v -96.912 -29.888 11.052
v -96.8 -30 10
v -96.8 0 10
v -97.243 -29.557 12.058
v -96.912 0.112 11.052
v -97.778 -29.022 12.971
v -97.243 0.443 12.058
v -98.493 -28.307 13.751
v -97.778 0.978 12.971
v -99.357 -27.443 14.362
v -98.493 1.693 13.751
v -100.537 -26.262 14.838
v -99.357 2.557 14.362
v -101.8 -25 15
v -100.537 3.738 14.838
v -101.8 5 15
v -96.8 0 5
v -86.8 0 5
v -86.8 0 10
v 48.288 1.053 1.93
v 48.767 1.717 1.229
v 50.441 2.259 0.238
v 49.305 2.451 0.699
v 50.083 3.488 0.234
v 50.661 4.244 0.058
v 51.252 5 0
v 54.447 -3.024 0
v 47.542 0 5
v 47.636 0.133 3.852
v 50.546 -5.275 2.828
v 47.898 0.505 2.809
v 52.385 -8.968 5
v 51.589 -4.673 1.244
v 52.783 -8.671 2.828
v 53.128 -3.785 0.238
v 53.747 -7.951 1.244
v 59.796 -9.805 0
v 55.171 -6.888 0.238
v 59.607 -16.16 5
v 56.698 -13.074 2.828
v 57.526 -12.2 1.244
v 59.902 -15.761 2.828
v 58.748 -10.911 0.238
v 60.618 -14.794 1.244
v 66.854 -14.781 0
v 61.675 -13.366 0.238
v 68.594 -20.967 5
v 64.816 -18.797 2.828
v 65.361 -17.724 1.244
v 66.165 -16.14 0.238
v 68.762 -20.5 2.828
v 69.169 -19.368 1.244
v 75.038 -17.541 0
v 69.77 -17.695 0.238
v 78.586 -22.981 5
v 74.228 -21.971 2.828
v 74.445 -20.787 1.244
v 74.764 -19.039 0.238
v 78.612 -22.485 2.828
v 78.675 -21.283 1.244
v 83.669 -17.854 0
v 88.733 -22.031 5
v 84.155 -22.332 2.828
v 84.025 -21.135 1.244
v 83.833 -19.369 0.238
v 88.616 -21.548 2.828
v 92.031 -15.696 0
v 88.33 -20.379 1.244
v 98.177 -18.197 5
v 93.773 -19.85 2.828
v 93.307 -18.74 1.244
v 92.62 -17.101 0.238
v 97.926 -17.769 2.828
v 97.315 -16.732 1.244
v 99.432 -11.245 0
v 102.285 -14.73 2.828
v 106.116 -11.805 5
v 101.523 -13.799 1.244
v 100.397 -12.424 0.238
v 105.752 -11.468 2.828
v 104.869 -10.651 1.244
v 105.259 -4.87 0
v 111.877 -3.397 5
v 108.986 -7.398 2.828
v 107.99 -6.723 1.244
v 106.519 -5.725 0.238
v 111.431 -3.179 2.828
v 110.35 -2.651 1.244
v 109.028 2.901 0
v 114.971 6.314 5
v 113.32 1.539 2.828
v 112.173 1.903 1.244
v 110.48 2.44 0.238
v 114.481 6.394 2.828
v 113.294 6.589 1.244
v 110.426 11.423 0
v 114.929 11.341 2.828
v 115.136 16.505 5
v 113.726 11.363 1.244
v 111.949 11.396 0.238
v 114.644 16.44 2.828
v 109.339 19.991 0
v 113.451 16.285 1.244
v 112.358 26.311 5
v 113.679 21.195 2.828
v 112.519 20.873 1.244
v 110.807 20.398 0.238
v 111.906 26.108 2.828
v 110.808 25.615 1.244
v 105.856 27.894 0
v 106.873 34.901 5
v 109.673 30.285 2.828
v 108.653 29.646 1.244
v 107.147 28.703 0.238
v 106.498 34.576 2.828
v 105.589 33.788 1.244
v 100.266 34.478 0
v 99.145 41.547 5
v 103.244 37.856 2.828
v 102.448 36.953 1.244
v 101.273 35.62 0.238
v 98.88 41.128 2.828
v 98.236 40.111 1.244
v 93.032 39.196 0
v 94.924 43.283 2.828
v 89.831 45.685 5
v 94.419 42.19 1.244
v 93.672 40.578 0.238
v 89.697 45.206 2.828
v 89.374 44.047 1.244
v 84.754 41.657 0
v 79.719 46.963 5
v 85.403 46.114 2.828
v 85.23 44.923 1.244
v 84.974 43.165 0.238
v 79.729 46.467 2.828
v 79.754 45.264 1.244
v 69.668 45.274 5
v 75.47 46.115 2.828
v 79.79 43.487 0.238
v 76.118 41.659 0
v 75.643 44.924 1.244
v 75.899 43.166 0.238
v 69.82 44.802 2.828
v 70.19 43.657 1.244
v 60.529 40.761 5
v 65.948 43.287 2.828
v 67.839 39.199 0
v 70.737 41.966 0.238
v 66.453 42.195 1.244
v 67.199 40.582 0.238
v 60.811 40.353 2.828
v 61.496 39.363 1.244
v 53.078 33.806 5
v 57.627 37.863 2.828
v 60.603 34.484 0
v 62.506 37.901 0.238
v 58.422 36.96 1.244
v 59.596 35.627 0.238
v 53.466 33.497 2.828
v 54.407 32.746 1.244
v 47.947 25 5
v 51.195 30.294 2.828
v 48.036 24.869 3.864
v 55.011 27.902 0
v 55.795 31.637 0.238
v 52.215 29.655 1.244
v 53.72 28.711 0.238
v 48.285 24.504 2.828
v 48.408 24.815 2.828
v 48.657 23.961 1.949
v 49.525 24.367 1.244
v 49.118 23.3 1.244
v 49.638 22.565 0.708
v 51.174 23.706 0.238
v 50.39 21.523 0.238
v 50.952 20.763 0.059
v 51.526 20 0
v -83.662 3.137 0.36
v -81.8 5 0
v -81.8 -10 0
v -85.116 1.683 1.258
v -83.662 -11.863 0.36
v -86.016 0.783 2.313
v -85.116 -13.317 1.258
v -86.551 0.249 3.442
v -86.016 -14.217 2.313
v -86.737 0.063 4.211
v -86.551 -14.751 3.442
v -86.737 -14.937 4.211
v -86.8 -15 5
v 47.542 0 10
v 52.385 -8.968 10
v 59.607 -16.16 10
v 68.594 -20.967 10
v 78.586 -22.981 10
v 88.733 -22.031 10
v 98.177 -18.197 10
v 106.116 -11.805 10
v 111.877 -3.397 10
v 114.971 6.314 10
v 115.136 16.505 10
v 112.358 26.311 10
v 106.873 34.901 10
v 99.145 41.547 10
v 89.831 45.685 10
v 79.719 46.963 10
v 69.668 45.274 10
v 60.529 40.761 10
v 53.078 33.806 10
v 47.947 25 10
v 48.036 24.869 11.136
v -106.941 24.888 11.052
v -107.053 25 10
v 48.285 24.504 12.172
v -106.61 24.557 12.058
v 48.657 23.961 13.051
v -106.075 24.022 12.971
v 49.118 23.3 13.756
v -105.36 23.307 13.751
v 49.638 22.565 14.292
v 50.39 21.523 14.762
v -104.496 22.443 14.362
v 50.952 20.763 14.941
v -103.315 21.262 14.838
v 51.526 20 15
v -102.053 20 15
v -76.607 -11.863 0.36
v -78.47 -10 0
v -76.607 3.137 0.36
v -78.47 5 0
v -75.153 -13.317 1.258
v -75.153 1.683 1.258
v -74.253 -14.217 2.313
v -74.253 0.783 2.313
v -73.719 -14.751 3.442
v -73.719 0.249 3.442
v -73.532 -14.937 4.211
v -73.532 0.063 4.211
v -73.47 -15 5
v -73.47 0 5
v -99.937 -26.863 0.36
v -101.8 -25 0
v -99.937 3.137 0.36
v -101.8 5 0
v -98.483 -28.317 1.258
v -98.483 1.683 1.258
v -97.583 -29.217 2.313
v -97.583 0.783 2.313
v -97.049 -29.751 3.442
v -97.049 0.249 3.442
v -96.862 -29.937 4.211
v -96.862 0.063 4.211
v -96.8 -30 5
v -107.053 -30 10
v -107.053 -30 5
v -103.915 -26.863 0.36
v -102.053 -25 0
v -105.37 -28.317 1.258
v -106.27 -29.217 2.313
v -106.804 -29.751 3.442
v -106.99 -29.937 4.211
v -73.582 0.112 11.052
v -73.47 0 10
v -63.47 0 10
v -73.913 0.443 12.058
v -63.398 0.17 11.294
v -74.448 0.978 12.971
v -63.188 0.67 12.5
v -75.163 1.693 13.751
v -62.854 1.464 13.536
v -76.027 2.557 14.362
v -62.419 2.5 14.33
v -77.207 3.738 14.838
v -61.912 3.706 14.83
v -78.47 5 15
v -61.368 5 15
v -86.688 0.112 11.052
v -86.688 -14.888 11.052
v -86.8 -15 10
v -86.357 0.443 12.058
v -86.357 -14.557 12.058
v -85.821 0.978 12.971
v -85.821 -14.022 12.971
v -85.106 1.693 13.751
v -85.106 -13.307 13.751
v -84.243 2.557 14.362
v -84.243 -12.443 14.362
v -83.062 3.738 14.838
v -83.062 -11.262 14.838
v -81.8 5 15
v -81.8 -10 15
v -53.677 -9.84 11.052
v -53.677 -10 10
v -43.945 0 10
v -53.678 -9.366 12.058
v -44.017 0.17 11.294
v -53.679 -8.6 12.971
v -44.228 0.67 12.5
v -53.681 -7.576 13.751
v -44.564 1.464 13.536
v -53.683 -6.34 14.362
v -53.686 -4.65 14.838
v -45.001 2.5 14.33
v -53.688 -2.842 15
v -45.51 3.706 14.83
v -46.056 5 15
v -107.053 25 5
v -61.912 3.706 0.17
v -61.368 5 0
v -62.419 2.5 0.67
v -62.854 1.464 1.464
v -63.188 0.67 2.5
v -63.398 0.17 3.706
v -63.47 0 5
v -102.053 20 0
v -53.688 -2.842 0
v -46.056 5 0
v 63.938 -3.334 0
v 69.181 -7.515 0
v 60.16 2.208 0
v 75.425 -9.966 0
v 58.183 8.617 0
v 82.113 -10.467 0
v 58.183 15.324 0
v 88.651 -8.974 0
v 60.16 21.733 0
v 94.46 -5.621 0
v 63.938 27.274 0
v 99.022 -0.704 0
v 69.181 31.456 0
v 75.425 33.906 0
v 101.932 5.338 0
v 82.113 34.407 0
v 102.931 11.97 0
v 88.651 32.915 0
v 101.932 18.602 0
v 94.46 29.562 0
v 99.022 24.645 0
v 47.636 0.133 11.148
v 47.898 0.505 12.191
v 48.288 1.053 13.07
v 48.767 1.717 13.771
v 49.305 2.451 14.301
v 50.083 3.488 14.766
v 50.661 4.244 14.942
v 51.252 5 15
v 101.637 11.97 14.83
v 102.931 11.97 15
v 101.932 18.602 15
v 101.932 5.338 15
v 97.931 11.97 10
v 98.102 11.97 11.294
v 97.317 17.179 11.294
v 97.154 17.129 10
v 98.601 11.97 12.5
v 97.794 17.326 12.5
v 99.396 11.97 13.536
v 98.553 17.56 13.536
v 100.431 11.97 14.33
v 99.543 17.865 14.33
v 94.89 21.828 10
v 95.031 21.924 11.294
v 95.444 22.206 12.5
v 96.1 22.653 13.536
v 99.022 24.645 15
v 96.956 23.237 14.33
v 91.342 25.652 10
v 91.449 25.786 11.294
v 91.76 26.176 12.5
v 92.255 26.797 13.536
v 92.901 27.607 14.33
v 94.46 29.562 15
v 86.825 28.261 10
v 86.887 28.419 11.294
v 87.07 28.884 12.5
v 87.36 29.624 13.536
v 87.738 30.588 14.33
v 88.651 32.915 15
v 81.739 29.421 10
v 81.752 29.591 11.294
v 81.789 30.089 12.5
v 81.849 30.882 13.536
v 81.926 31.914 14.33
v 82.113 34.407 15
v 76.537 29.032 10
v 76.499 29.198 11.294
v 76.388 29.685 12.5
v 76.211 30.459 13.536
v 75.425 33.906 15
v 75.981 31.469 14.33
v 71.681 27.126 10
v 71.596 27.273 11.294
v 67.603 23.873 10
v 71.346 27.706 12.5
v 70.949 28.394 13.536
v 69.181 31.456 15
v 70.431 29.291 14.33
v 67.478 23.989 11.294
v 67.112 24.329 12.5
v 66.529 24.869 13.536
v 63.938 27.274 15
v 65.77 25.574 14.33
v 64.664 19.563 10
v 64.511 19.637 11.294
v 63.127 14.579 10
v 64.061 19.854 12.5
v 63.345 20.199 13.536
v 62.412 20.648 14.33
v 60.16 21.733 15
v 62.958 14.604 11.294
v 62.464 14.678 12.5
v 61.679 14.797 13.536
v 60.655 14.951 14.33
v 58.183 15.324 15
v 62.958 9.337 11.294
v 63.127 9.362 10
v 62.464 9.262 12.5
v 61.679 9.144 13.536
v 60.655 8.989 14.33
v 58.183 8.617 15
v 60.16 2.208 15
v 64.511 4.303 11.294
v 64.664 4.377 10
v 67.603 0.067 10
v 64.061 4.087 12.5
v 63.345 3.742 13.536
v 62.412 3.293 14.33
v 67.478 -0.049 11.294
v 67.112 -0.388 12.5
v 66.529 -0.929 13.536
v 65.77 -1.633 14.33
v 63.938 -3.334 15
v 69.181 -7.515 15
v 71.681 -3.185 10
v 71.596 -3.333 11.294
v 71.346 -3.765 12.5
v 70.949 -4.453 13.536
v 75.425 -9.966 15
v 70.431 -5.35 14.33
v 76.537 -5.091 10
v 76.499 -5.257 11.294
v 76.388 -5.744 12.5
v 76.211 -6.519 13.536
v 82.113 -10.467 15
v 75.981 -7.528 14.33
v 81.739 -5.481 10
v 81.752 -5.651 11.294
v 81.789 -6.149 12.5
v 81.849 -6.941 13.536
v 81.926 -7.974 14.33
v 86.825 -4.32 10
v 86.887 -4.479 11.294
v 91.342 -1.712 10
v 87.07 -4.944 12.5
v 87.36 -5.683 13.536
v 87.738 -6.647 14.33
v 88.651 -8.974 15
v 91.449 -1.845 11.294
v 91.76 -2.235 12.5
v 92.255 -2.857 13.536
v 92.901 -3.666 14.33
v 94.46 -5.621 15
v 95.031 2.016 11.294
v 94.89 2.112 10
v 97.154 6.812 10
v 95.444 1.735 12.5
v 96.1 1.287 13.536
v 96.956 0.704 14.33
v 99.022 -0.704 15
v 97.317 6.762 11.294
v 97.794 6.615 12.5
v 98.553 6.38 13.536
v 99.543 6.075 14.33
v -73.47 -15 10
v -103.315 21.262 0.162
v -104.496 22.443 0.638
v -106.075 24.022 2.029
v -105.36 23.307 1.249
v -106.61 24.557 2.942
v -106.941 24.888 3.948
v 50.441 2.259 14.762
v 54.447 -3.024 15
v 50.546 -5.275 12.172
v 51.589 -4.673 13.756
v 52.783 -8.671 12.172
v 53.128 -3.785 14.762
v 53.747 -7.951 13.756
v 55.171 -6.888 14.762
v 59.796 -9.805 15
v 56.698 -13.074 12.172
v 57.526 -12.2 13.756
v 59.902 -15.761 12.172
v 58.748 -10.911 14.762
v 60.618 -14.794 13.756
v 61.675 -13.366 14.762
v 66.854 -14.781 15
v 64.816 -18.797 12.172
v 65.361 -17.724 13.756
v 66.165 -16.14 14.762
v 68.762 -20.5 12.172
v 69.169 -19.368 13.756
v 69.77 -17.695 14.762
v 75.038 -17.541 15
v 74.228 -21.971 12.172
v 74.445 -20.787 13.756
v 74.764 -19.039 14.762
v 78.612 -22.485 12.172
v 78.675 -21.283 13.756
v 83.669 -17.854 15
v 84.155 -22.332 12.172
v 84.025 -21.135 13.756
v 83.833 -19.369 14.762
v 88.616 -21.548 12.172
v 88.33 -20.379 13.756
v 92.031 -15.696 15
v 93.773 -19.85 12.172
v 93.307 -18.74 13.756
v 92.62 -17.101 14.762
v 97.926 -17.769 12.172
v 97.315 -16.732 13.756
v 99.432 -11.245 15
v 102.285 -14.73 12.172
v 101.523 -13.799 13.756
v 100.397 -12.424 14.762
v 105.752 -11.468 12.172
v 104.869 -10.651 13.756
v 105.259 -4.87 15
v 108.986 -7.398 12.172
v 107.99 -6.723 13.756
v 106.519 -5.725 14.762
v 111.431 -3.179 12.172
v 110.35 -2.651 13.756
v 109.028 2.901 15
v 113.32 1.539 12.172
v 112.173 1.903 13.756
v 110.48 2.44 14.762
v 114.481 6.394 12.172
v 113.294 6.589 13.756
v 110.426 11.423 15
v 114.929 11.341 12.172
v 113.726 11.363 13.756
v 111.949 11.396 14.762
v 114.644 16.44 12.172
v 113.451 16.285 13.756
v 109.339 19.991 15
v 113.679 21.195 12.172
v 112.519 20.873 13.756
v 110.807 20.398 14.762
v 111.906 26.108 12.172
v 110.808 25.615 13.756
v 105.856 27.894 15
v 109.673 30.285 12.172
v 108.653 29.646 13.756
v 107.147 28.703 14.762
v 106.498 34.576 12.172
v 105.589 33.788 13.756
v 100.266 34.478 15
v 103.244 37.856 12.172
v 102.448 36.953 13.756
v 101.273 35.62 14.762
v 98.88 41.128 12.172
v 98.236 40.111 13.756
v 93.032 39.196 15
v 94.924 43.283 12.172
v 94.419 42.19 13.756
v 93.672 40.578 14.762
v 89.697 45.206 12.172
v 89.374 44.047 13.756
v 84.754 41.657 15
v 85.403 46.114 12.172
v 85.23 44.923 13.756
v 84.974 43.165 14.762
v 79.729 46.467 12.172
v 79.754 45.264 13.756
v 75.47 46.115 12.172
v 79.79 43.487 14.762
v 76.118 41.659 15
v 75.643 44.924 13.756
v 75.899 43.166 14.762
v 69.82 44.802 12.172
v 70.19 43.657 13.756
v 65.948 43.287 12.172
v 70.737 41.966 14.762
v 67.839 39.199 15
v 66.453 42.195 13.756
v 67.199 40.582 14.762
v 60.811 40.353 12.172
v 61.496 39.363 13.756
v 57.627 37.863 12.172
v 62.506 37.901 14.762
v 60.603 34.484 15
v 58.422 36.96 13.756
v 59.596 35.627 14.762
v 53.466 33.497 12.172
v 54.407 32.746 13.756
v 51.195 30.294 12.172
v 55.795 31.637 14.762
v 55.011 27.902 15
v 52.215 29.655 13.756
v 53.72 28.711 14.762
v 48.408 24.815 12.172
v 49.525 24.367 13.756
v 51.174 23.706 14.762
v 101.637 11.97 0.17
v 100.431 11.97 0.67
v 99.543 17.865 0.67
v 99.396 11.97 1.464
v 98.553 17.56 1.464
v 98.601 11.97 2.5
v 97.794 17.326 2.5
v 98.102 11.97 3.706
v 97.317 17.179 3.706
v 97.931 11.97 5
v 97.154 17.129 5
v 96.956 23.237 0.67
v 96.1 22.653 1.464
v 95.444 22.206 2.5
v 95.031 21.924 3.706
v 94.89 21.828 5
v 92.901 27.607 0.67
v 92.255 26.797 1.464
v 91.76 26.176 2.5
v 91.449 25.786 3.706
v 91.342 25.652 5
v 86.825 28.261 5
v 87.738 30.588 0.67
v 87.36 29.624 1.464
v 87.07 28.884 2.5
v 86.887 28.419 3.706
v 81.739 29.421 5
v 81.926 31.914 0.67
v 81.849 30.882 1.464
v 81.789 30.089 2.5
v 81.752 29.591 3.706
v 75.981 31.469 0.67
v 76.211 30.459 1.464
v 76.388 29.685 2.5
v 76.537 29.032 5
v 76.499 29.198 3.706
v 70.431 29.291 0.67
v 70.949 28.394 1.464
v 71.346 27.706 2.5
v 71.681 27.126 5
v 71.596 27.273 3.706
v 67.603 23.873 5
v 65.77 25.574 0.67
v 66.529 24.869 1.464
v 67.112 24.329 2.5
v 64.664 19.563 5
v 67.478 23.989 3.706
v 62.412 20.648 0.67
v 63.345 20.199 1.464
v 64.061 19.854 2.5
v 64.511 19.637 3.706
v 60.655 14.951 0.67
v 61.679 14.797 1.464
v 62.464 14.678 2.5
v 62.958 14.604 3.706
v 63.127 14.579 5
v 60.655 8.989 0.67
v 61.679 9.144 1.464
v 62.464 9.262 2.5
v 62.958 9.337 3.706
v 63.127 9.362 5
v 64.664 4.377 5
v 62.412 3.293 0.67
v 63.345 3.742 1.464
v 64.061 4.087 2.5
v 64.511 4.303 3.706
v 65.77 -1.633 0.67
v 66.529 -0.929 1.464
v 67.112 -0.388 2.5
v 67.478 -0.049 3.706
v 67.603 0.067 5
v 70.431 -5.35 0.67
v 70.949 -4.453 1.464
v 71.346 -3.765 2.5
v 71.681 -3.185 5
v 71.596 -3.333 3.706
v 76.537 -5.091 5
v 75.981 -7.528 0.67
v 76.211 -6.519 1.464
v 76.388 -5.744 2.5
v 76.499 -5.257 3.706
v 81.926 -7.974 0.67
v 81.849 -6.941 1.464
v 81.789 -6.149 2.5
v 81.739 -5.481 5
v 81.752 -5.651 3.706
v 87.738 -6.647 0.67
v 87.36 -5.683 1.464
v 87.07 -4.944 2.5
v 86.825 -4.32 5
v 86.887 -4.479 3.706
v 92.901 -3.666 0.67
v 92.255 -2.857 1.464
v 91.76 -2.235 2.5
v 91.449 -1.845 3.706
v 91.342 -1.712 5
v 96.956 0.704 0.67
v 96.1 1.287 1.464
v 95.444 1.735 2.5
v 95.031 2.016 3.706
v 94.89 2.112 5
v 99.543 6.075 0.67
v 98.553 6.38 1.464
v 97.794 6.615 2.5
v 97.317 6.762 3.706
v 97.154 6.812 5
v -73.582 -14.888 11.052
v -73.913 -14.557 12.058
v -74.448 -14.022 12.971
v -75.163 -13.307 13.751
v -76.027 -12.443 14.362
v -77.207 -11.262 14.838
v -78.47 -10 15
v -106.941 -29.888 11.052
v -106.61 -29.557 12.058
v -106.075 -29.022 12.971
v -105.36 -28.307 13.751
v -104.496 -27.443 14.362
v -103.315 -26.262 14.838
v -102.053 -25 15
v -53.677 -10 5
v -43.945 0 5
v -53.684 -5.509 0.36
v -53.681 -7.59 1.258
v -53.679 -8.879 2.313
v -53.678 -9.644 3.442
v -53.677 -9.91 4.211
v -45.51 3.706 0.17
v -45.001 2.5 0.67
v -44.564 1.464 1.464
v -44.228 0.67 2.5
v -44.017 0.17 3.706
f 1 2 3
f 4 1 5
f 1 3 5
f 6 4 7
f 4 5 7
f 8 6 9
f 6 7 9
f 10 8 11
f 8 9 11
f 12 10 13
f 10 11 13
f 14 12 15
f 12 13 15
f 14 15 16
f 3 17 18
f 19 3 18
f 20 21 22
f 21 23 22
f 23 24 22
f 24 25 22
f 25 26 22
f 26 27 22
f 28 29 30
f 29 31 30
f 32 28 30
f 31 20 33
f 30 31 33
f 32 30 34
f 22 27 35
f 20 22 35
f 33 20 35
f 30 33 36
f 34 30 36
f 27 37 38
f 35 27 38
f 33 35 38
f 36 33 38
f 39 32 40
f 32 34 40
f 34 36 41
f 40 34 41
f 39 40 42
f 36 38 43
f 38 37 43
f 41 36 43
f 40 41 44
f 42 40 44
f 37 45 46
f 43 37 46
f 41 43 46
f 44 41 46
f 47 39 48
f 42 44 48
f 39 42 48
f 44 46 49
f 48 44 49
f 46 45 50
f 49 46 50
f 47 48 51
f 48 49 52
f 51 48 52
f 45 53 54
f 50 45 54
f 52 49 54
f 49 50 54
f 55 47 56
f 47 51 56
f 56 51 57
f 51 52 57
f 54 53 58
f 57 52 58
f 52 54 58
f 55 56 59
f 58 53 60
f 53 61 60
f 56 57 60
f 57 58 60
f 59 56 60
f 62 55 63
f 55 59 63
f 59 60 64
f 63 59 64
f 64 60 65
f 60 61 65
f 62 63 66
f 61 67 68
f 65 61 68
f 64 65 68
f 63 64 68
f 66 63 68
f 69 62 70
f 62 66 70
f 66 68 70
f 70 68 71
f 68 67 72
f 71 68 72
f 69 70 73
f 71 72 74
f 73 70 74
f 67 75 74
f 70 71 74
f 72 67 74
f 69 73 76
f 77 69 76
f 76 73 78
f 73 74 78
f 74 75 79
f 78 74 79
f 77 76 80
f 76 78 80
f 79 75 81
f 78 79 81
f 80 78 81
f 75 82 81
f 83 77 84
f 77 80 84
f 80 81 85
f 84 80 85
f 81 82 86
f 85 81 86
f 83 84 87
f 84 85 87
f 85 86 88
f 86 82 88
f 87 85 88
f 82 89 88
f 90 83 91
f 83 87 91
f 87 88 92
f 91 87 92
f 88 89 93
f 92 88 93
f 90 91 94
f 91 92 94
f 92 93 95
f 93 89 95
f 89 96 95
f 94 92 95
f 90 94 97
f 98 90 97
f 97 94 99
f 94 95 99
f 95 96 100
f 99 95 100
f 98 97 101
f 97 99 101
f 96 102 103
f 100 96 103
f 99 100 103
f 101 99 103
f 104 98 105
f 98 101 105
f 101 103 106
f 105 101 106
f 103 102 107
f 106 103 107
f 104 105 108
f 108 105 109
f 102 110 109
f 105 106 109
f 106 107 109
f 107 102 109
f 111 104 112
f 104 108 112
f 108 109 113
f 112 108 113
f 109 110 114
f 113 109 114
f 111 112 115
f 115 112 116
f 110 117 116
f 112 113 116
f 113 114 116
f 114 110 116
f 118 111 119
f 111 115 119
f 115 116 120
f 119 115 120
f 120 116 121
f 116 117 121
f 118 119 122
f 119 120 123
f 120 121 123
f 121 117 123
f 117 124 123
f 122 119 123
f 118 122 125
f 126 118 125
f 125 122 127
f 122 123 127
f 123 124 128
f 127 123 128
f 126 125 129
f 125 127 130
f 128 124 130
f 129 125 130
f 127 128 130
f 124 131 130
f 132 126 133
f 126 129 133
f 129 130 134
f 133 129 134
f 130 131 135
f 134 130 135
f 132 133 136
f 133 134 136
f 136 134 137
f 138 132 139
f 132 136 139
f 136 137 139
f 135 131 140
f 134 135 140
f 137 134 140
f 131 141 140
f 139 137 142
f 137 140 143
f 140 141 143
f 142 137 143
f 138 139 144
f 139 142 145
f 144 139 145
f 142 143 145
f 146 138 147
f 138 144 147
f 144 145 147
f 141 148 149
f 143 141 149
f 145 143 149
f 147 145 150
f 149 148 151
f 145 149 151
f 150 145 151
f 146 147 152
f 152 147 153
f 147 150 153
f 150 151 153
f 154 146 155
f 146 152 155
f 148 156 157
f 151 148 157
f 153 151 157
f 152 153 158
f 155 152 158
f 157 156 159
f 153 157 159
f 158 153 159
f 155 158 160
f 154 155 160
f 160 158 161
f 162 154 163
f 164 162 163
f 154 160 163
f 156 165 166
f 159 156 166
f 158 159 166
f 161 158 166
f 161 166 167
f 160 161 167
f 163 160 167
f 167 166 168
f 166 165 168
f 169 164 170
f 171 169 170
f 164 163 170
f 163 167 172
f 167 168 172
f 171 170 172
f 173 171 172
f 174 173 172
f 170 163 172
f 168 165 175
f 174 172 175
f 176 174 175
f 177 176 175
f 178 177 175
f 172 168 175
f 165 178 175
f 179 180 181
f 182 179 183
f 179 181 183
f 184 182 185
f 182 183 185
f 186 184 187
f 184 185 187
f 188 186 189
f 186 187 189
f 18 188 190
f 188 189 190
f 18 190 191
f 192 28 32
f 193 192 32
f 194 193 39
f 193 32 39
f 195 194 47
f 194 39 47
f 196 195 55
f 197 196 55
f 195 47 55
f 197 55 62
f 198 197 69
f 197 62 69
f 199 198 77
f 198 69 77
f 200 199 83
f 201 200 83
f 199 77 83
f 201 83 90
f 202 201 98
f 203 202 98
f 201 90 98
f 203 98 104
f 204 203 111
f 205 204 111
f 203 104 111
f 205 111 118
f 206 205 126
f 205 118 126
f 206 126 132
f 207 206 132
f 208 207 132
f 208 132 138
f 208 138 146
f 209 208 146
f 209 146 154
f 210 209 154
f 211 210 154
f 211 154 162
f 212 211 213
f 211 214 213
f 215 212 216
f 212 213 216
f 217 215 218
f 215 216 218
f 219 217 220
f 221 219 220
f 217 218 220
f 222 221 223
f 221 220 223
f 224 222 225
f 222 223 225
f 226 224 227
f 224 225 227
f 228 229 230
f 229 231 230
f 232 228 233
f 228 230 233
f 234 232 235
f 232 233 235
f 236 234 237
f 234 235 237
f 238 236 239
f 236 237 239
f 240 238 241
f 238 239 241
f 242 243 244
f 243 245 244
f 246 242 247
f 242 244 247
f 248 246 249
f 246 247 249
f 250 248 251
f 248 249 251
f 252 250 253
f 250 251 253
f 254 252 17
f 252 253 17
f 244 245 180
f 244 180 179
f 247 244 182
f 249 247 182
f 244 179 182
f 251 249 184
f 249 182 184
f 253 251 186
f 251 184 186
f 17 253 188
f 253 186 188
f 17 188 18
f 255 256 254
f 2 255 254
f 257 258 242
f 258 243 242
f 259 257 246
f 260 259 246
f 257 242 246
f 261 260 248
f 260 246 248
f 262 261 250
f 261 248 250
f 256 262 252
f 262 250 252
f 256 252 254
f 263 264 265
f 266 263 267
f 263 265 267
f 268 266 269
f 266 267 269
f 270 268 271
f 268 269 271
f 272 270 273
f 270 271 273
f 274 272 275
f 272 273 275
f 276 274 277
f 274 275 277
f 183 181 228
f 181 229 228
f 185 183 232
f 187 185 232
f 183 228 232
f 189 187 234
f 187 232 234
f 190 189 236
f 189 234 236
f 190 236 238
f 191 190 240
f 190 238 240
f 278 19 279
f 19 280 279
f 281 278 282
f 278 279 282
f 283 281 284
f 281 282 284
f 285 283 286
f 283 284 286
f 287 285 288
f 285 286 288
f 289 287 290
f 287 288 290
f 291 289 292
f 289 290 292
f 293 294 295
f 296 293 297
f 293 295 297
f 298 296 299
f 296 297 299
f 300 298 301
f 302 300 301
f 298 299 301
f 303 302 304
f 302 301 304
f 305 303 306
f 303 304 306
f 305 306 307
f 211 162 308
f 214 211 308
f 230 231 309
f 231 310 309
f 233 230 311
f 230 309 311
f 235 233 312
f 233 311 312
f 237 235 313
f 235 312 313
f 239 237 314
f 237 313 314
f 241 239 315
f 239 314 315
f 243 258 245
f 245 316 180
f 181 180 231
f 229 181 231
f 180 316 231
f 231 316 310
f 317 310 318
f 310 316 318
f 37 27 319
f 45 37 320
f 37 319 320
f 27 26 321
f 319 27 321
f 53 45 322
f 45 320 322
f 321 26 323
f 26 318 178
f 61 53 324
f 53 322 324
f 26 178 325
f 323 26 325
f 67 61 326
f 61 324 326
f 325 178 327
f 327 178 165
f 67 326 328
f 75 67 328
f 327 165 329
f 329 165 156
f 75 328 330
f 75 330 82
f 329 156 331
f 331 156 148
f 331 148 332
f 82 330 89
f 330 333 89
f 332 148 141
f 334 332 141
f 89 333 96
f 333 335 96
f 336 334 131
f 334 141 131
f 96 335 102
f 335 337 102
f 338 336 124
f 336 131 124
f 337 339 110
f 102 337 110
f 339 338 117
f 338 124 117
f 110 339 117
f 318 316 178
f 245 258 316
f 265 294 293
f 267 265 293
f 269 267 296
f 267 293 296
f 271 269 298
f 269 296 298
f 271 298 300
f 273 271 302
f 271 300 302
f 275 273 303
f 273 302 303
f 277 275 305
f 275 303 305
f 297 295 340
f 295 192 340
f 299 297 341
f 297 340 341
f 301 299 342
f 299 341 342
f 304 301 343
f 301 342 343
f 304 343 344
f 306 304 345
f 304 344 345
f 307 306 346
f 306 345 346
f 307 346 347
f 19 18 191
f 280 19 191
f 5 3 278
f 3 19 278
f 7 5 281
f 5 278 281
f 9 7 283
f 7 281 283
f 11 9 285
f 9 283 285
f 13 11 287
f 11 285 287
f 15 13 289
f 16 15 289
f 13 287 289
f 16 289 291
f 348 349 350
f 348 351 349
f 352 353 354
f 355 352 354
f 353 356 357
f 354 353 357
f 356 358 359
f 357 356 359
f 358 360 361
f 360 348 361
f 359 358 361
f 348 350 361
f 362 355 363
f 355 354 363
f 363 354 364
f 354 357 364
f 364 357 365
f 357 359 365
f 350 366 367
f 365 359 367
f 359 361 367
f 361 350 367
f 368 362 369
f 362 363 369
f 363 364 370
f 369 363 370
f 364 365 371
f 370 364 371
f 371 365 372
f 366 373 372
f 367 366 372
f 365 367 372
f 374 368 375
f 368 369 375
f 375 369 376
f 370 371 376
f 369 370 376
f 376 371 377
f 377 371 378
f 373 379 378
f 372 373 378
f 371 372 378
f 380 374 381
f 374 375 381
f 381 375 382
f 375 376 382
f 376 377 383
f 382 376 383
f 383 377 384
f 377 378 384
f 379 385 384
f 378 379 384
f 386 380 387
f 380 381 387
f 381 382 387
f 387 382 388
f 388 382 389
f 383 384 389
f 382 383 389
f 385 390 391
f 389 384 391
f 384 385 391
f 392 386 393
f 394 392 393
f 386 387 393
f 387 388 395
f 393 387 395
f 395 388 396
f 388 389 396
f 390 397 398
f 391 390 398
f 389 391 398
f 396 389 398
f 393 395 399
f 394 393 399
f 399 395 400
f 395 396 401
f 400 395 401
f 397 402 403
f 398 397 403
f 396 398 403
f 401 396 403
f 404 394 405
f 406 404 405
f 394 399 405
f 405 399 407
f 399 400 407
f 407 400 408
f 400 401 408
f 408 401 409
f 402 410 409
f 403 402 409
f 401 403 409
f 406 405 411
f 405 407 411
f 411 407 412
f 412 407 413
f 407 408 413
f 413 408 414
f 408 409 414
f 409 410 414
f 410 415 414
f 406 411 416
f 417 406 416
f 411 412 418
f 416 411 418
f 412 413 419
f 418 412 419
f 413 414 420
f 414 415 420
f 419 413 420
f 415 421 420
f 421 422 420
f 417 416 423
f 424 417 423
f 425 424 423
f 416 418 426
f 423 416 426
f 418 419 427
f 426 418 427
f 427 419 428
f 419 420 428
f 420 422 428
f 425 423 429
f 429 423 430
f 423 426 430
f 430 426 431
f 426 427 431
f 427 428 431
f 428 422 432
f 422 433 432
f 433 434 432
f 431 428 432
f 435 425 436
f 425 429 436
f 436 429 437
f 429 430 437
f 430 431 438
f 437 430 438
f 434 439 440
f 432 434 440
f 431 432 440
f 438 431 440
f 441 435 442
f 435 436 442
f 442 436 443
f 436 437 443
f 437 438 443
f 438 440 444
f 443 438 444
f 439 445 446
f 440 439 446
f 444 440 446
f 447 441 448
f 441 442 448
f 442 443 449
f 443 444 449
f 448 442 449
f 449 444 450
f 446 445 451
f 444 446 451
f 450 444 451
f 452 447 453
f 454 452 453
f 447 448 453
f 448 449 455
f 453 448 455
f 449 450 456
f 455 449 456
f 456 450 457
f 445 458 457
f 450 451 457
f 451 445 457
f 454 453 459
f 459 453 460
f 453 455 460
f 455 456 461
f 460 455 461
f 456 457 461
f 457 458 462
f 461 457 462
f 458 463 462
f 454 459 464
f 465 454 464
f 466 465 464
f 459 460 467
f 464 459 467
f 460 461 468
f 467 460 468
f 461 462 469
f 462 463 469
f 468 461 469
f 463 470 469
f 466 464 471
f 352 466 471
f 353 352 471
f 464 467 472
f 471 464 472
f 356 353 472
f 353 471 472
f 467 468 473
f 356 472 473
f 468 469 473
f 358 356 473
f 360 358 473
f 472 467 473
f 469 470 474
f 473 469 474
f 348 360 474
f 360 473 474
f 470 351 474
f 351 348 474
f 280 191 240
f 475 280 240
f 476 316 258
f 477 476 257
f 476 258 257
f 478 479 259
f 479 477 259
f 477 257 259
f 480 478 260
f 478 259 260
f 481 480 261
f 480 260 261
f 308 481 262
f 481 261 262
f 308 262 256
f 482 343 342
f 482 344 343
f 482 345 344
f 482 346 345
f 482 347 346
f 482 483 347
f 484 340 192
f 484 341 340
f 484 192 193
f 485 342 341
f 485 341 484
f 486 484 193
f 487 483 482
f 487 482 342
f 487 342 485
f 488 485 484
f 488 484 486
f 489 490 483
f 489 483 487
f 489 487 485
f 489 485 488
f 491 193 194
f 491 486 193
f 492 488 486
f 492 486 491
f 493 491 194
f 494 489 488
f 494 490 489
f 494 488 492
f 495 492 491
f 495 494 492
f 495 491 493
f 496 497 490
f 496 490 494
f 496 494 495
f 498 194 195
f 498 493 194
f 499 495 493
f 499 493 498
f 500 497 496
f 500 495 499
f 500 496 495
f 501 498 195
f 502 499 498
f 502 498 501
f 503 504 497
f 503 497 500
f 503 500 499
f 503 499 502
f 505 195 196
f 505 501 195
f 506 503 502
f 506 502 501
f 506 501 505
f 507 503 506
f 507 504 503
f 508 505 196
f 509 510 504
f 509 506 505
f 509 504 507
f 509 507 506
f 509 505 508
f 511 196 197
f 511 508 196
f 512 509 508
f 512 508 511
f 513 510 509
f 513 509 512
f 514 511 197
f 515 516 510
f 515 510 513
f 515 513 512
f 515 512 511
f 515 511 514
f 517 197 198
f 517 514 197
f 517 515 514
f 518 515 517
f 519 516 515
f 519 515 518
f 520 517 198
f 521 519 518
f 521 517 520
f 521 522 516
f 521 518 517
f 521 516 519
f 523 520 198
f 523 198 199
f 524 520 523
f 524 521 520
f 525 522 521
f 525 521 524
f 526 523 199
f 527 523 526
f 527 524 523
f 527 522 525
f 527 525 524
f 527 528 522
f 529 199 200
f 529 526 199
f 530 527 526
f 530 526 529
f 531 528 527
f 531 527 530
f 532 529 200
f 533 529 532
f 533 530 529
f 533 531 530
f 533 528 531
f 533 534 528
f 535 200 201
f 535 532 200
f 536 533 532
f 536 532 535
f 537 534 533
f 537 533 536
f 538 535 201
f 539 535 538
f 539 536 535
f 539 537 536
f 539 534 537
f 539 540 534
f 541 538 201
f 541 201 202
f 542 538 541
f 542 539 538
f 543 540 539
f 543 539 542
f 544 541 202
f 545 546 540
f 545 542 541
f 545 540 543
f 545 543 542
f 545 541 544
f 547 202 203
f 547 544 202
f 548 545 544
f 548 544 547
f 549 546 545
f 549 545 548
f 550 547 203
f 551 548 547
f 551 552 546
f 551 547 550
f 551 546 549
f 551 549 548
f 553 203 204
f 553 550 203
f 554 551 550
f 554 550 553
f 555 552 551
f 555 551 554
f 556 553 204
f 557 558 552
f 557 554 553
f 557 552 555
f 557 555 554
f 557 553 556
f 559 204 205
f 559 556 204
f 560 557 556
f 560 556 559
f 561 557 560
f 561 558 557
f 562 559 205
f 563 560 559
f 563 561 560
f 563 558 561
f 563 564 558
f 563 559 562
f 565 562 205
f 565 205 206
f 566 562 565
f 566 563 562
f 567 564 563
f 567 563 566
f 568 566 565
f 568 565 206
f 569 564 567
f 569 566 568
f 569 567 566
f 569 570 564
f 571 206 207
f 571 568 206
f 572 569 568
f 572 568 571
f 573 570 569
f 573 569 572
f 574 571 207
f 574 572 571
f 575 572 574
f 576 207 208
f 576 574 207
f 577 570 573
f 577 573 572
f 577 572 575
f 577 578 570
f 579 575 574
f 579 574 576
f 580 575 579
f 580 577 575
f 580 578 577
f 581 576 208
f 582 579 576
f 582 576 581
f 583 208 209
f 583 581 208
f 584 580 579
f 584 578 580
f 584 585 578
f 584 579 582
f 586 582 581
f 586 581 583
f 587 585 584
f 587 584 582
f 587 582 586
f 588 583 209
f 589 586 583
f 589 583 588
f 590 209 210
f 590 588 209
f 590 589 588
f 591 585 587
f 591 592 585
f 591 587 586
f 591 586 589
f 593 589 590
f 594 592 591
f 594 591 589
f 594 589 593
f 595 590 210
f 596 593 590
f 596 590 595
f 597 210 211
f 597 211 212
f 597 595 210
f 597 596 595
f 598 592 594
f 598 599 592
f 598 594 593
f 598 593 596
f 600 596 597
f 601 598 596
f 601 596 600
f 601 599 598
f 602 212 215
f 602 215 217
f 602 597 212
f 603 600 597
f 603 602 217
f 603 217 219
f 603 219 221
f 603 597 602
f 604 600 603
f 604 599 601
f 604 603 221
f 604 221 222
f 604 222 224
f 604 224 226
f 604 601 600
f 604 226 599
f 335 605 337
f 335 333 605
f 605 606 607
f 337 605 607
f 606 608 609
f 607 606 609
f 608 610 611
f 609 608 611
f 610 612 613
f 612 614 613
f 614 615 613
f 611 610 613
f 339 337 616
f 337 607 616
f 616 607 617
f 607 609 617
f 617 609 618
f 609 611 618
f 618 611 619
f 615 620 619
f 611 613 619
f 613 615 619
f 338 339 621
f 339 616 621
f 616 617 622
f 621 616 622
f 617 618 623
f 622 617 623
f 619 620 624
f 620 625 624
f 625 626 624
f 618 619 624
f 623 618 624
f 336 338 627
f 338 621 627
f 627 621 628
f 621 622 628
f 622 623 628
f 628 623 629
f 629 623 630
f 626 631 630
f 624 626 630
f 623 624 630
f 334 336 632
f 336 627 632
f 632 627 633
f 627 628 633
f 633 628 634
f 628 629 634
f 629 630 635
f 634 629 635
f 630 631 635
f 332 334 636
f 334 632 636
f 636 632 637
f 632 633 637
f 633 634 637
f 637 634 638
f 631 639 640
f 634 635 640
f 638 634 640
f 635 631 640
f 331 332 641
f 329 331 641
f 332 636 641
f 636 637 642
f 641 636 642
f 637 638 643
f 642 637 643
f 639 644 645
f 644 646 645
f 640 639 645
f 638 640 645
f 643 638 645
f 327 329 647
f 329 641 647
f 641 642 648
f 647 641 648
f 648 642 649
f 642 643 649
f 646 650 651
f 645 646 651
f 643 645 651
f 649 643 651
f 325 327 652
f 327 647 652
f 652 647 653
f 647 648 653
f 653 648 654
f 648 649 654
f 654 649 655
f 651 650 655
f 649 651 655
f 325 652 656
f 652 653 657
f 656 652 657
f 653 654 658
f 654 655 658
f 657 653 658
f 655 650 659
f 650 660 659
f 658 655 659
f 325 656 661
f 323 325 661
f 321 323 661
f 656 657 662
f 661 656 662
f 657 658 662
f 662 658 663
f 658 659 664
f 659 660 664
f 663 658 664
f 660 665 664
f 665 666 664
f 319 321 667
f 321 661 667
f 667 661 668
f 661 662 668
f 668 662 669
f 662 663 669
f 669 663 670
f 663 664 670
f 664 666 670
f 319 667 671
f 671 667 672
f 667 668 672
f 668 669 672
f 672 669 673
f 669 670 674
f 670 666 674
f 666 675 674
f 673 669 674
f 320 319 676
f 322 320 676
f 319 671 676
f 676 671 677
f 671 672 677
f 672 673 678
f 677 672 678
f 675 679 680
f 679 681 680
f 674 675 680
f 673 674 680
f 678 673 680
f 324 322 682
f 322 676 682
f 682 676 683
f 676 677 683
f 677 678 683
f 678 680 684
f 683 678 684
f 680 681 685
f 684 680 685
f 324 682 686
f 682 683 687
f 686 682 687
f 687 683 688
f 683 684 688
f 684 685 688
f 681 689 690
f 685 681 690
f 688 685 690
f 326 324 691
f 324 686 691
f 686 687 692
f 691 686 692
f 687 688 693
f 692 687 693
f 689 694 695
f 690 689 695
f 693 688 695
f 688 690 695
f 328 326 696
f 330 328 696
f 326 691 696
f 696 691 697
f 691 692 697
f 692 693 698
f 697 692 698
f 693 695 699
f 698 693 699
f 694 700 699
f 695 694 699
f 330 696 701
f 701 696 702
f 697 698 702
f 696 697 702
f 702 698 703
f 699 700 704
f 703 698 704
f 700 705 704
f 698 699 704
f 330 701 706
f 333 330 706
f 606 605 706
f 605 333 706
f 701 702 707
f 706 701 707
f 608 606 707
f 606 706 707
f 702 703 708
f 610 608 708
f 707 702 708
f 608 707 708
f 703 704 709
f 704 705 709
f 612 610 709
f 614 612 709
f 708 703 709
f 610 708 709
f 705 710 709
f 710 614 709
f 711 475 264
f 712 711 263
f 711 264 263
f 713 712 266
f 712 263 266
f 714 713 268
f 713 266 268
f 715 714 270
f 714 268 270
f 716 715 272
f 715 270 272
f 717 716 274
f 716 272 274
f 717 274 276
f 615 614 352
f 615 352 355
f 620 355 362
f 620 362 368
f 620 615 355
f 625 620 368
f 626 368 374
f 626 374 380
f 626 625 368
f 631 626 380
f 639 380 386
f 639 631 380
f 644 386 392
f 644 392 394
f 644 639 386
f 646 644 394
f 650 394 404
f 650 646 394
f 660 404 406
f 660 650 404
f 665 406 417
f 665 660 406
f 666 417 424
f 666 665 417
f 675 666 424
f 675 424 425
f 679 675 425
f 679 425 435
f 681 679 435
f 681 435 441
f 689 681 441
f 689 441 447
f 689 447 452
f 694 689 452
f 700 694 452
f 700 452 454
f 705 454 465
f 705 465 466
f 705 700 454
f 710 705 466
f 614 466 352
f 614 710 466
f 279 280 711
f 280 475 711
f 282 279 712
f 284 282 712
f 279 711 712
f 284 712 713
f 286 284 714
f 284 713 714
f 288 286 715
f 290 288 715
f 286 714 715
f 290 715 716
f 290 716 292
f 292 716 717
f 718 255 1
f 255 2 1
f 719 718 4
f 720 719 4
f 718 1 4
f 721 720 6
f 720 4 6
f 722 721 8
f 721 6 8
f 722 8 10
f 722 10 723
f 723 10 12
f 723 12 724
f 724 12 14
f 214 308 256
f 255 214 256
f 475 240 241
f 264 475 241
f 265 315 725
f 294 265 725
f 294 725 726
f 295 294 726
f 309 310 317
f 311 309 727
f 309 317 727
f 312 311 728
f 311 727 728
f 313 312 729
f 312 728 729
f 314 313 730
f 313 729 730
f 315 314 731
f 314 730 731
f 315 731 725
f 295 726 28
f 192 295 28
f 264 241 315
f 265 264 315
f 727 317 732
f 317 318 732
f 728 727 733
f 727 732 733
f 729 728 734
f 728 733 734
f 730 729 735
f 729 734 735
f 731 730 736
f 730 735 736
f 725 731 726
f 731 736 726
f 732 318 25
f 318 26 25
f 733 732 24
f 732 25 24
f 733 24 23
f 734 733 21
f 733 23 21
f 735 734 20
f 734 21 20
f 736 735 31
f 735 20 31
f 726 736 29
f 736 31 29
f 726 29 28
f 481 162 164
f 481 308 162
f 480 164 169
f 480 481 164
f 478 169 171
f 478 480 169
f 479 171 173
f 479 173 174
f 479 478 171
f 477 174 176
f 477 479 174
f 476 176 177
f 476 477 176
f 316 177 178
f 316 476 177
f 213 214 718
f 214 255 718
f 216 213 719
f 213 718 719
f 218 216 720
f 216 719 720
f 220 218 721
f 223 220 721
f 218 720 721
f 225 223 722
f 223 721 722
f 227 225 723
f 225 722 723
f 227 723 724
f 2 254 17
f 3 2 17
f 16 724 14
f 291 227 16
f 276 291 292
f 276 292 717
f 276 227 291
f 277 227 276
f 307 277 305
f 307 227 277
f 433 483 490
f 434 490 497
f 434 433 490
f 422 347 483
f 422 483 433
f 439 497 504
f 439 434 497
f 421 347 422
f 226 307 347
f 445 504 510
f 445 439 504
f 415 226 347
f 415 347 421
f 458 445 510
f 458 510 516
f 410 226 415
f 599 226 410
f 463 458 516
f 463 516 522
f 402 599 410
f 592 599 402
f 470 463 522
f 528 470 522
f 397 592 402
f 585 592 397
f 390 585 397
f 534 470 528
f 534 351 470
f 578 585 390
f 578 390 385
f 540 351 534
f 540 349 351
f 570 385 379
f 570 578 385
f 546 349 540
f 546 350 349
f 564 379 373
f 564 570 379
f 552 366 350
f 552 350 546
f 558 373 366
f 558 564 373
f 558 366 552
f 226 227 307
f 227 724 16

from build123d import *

# Parameters (mm, degrees)
F0_R     = 17.5
F1_DEPTH = 15
F2_R     = 5
F3_R     = 5


with BuildPart() as f1:
    # F0 (on Top) → F1 (new body)
    with BuildSketch(Plane.XY):
        with BuildLine():
            Line((47.947033, 25), (-107.052967, 25))
            Line((-107.052967, 25), (-107.052967, 0))
            Line((-107.052967, 0), (-107.052967, -30))
            Line((-107.052967, -30), (-96.799608, -30))
            Line((-96.799608, -30), (-96.799608, 0))
            Line((-96.799608, 0), (-86.799608, 0))
            Line((-86.799608, 0), (-86.799608, -15))
            Line((-86.799608, -15), (-73.469838, -15))
            Line((-73.469838, -15), (-73.469838, 0))
            Line((-73.469838, 0), (-63.469838, 0))
            Line((-63.469838, 0), (-53.677226, -10))
            Line((-53.677226, -10), (-43.945315, 0))
            Line((-43.945315, 0), (47.541927, 0))
            ThreePointArc((47.541927, 0), (115.42671, 11.403261), (47.947033, 25))
        make_face()
        with Locations((80.431304, 11.970335)):
            Circle(F0_R, mode=Mode.SUBTRACT)
    extrude(amount=F1_DEPTH)

    # F2
    f2_edges = [f1.edges().sort_by_distance(p)[0] for p in [
        (-29.552967, 25, 15),
        (-107.052967, -2.5, 15),
        (-96.799608, -15, 15),
        (-101.926287, -30, 15),
        (-86.799608, -7.5, 15),
        (-80.134723, -15, 15),
        (-73.469838, -7.5, 15),
        (-68.469838, 0, 15),
        (-91.799608, 0, 15),
        (-58.573532, -5, 15),
        (-48.81127, -5, 15),
        (1.798306, 0, 15),
        (115.42671, 11.403261, 15),
        (62.931304, 11.970335, 15),
    ]]
    fillet(f2_edges, radius=F2_R)

    # F3
    f3_edges = [f1.edges().sort_by_distance(p)[0] for p in [
        (115.42671, 11.403261, 0),
        (1.798306, 0, 0),
        (-48.81127, -5, 0),
        (-58.573532, -5, 0),
        (-68.469838, 0, 0),
        (-73.469838, -7.5, 0),
        (-80.134723, -15, 0),
        (-91.799608, 0, 0),
        (-29.552967, 25, 0),
        (-107.052967, -2.5, 0),
        (-101.926287, -30, 0),
        (-96.799608, -15, 0),
        (-86.799608, -7.5, 0),
        (62.931304, 11.970335, 0),
    ]]
    fillet(f3_edges, radius=F3_R)


solid = f1.part
